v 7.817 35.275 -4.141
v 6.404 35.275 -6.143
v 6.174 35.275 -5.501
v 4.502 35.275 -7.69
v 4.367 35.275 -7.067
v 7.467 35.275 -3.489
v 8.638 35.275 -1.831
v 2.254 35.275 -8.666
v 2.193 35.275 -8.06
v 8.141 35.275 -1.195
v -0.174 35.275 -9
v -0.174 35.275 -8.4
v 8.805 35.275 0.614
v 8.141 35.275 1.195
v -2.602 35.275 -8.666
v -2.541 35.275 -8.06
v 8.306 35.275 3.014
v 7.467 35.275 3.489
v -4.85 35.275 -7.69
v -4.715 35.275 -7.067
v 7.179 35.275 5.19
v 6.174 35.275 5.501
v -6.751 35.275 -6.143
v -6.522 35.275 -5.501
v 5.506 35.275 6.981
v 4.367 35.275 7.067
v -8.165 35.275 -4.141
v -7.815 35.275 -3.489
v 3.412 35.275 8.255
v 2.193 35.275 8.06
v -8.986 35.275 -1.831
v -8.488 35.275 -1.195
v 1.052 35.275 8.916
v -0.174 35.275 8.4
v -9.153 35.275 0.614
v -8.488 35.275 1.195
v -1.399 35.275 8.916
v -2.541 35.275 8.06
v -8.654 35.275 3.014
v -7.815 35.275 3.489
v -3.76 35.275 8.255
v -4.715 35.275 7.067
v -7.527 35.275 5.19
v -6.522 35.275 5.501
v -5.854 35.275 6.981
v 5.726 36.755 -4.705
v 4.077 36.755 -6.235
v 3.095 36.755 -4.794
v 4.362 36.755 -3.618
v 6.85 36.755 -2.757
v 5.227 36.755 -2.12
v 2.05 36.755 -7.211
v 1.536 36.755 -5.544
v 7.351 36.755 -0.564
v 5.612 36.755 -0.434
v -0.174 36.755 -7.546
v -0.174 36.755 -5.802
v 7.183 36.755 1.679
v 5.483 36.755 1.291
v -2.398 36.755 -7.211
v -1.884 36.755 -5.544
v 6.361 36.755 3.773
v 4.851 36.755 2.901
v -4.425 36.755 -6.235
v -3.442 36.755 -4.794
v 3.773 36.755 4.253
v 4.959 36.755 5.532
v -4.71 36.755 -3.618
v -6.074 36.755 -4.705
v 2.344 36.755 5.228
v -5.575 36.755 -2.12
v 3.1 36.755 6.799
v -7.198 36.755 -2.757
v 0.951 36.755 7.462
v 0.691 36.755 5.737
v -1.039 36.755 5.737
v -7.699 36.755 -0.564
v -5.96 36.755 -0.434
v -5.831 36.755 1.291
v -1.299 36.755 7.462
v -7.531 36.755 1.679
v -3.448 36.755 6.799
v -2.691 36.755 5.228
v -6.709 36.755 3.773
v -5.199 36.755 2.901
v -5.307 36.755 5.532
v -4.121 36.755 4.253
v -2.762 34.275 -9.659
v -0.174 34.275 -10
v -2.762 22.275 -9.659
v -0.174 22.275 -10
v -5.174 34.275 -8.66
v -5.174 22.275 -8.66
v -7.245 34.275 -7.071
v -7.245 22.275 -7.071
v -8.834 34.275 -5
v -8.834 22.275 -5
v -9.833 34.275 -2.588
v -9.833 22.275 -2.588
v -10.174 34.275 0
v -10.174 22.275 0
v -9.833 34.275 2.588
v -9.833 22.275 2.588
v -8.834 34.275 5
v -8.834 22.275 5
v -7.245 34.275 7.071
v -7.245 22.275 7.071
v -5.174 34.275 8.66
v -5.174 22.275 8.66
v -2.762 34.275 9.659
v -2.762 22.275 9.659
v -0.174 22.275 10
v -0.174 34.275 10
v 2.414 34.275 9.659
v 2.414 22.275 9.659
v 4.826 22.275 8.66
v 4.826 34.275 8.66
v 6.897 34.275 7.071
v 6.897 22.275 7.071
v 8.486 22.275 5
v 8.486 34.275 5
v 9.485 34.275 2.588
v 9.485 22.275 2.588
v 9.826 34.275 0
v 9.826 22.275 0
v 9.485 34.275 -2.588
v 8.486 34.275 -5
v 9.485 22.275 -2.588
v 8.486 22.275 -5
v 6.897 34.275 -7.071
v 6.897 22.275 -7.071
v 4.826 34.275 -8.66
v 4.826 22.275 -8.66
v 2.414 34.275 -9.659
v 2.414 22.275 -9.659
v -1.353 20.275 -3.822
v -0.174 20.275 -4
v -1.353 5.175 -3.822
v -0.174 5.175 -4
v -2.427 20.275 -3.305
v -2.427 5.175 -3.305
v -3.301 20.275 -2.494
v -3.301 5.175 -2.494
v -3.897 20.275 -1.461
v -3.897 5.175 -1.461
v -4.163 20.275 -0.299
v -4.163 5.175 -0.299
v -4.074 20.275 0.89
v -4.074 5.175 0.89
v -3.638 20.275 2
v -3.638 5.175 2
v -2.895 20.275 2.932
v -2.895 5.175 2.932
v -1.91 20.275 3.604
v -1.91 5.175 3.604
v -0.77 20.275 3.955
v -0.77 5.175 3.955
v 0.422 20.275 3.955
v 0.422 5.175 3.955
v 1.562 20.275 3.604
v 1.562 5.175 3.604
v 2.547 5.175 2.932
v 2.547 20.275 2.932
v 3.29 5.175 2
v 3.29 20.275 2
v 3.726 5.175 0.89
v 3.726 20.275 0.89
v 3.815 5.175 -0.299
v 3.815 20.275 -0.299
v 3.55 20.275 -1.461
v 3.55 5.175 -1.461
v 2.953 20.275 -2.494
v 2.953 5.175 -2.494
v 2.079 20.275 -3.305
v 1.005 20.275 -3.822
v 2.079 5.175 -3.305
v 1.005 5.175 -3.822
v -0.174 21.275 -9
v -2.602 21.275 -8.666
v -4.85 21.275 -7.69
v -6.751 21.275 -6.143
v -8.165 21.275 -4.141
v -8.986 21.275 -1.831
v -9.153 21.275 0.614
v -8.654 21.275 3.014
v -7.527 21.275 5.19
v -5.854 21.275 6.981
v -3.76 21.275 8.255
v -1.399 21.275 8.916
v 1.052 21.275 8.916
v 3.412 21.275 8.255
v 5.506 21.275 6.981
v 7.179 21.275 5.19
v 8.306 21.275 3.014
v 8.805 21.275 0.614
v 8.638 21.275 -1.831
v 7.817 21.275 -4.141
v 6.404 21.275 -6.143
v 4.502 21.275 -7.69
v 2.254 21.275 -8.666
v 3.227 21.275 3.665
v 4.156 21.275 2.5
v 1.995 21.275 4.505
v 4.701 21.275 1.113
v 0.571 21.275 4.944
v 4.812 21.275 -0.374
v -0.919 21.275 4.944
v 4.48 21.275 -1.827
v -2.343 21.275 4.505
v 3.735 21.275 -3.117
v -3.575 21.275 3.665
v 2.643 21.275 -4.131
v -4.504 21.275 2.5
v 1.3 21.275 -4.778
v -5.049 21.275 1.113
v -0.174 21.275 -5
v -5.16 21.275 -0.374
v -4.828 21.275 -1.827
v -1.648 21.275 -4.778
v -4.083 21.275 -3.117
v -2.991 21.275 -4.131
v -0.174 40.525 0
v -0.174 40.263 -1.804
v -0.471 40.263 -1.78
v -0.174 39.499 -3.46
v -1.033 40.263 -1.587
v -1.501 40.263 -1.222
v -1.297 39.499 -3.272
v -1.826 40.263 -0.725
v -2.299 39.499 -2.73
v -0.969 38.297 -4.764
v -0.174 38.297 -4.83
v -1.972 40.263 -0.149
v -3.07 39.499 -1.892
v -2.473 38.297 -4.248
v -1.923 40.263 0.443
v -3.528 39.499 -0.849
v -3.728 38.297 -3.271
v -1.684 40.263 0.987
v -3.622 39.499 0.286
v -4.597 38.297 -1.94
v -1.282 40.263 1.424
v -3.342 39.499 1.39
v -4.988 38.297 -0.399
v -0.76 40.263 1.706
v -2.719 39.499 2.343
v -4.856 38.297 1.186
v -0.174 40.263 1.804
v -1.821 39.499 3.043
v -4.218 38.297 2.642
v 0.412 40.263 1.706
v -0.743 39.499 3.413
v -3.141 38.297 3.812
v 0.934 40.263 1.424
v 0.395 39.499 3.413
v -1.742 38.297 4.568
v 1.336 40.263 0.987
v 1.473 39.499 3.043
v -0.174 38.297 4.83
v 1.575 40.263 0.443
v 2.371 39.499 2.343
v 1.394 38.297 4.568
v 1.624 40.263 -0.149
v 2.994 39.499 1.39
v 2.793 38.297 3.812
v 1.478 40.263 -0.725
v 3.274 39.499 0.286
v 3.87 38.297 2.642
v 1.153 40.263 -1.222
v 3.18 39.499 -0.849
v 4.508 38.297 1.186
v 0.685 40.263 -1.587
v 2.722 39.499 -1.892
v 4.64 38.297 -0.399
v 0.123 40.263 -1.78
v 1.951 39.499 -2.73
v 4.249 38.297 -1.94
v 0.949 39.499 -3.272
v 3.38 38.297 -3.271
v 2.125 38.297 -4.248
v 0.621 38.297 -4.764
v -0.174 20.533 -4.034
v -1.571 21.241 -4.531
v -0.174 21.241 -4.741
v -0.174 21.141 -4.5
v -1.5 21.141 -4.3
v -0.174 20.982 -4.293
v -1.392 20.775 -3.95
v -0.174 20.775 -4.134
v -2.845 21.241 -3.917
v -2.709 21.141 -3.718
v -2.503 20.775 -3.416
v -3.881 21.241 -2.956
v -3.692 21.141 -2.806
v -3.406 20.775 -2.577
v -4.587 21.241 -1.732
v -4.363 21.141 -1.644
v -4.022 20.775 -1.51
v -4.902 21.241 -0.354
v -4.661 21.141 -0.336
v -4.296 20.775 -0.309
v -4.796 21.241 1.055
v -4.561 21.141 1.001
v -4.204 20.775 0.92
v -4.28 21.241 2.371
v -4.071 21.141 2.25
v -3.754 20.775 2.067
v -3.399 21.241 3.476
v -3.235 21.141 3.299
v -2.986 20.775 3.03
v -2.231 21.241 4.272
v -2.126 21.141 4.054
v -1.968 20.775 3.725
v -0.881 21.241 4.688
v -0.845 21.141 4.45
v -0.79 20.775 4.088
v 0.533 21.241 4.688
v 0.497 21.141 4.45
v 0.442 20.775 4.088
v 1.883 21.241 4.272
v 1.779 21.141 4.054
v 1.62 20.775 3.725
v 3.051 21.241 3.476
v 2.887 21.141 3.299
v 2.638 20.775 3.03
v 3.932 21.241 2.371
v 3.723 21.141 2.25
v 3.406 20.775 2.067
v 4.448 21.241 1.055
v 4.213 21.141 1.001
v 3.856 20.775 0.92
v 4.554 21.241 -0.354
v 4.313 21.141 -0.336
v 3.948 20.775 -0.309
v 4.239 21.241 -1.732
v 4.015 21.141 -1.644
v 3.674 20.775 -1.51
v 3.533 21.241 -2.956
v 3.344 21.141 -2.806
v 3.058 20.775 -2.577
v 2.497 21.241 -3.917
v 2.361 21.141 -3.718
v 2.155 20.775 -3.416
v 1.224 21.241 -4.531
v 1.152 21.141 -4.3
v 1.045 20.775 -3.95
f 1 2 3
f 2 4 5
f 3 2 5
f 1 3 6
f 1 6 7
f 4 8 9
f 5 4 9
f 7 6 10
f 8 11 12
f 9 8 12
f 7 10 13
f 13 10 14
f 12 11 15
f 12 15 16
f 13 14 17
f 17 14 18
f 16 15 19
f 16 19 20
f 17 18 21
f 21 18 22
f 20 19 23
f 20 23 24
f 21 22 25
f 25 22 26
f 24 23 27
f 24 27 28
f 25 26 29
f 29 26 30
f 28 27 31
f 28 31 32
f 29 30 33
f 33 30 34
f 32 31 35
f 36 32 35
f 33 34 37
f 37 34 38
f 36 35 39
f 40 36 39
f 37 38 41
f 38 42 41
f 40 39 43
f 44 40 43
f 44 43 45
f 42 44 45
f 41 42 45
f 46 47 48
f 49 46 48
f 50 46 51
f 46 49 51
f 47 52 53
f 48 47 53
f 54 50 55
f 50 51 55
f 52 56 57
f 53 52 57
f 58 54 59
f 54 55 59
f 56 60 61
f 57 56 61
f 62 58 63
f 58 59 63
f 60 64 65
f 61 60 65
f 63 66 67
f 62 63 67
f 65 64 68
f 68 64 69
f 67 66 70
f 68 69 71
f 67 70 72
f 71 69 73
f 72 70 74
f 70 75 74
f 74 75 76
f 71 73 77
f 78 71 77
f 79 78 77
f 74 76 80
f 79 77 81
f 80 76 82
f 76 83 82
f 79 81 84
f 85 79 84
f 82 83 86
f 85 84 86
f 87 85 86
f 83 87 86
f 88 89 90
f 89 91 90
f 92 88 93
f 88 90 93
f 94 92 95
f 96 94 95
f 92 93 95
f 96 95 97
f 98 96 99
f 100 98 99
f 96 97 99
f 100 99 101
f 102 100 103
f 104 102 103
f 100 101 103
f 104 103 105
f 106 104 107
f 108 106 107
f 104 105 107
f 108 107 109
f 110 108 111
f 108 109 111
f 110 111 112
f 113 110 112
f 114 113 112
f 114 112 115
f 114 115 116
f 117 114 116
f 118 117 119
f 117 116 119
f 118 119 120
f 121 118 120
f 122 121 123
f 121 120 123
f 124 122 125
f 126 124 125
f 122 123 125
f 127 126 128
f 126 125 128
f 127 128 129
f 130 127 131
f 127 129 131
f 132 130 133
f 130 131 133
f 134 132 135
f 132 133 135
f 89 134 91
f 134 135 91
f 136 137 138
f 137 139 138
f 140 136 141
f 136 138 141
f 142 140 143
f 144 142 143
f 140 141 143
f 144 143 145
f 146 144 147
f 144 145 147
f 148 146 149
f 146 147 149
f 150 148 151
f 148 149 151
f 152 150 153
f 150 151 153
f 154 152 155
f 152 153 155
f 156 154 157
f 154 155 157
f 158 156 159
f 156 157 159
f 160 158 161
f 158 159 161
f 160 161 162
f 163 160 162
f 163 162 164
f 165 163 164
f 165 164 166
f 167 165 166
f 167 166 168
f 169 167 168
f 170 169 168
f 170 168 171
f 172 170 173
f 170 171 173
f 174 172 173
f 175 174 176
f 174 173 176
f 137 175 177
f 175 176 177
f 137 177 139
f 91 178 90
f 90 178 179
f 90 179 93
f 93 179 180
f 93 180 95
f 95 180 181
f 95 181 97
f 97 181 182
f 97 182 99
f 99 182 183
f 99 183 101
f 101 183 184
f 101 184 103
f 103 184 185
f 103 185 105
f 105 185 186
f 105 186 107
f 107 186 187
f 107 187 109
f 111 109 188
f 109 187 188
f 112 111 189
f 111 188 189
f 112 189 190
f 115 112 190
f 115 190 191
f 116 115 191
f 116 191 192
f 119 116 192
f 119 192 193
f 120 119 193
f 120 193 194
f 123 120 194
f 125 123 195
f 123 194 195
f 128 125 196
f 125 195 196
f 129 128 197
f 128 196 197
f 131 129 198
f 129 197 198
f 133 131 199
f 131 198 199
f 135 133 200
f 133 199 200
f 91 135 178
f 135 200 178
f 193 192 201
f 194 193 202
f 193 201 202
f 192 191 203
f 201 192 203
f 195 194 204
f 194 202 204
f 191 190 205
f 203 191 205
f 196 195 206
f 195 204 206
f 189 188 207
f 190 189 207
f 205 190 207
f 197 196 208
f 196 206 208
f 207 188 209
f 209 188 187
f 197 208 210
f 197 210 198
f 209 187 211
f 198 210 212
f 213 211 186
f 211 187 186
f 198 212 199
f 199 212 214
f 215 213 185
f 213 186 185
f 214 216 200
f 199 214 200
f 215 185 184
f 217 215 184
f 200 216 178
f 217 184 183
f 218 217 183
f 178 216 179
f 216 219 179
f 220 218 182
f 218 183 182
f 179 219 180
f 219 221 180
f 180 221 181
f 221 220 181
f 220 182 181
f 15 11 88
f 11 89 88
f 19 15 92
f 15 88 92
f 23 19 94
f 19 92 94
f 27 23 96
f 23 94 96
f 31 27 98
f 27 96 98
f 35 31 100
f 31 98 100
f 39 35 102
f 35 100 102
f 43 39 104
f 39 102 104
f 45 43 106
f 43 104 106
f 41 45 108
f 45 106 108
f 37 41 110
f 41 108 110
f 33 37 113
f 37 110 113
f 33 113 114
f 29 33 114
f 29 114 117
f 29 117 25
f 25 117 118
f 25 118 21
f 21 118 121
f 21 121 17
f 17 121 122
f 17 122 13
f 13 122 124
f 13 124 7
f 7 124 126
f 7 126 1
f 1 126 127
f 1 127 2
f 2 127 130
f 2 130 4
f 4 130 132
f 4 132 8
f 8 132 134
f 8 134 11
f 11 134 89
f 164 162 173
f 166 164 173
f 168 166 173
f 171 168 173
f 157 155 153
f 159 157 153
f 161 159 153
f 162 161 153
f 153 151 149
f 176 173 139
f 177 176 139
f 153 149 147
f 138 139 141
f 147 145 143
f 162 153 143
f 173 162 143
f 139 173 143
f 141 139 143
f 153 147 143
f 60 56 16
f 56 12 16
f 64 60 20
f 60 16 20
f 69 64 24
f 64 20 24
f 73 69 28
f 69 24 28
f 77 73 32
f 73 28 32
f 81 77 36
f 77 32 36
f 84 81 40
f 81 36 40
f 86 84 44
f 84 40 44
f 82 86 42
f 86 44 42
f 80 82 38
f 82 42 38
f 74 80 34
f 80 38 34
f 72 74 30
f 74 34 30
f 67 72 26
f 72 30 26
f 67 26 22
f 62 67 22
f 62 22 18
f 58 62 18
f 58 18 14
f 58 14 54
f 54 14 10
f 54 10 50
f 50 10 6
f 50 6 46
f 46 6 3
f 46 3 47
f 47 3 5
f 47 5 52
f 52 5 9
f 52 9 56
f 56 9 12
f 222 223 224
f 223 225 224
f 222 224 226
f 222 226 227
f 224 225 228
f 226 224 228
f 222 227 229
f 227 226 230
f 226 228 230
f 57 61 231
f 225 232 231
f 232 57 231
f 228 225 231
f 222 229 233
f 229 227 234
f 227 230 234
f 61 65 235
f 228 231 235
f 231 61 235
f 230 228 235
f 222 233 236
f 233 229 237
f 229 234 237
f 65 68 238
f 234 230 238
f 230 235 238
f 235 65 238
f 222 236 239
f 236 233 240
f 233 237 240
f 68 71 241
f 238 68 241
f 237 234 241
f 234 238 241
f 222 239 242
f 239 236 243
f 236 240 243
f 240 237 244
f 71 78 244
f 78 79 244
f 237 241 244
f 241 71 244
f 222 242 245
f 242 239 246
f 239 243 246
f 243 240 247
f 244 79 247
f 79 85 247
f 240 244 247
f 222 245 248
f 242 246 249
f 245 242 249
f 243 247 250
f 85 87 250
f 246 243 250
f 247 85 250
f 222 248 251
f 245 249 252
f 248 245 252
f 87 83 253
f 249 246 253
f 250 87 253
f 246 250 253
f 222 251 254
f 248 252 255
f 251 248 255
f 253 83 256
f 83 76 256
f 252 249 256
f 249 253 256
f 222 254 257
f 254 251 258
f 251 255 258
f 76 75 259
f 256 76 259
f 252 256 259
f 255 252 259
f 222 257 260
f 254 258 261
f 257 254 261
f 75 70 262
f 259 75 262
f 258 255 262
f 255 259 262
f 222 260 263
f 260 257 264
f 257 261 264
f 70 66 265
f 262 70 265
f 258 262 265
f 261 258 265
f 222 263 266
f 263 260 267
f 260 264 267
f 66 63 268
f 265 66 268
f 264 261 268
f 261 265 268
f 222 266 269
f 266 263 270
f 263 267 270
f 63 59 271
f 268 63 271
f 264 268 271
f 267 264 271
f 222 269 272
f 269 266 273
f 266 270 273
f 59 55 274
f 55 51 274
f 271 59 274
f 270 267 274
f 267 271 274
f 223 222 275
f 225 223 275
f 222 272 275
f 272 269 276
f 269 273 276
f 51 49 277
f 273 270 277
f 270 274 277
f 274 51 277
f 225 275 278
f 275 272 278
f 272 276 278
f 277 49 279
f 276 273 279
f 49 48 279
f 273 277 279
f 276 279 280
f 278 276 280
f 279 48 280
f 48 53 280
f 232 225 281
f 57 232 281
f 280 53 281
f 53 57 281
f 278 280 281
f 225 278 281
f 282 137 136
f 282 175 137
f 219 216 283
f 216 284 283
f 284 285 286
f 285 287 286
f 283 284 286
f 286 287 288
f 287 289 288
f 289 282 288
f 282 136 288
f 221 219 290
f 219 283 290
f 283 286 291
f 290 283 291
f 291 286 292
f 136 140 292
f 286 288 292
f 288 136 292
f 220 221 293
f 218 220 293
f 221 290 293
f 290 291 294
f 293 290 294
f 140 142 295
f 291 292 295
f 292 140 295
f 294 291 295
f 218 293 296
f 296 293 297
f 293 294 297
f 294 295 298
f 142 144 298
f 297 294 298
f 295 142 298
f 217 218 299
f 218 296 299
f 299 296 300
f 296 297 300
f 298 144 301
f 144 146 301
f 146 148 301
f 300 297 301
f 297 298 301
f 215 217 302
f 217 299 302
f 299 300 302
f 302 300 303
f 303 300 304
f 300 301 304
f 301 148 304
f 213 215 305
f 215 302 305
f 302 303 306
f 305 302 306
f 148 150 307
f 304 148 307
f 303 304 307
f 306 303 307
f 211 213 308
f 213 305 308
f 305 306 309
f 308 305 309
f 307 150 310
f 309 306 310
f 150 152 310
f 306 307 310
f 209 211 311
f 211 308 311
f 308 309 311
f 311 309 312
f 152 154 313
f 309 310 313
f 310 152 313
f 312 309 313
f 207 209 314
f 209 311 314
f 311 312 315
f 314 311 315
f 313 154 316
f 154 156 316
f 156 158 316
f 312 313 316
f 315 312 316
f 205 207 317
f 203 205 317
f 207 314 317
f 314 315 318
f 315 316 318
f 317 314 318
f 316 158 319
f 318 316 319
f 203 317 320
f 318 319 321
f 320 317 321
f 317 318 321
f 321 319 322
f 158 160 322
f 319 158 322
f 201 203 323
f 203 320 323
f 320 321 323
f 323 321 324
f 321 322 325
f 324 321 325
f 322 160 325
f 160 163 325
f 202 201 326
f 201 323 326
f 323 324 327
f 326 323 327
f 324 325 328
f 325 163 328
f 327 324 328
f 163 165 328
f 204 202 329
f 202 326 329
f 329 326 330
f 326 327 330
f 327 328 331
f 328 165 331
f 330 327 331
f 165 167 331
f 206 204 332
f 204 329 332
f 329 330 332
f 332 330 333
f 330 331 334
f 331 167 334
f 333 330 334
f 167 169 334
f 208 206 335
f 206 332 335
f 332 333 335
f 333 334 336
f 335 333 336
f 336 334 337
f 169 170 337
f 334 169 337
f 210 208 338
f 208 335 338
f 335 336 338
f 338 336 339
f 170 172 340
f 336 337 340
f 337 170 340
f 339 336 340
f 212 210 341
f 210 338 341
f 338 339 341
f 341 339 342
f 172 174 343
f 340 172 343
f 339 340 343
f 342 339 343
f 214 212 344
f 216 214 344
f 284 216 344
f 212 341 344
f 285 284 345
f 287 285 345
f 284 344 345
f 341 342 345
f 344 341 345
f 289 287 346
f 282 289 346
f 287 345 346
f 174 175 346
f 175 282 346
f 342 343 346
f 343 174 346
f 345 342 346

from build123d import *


with BuildPart() as part:
    # Sketch1 → Revolve1 (revolve)
    with BuildSketch(Plane.XY, mode=Mode.PRIVATE) as revolve1_sk:
        with BuildLine():
            Line((5.628277432, 36.754630752), (7.372072988, 36.754630752))
            Line((7.372072988, 36.754630752), (8.226027868, 35.274630752))
            Line((8.226027868, 35.274630752), (8.826027868, 35.274630752))
            Line((8.826027868, 35.274630752), (9.826027868, 34.274630752))
            Line((9.826027868, 34.274630752), (9.826027868, 22.274630752))
            Line((9.826027868, 22.274630752), (8.826027868, 21.274630752))
            Line((8.826027868, 21.274630752), (4.826027868, 21.274630752))
            ThreePointArc((4.826027868, 21.274630752), (4.118921087, 20.981737533), (3.826027868, 20.274630752))
            Line((3.826027868, 20.274630752), (3.826027868, 5.174630752))
            Line((3.826027868, 5.174630752), (-0.173972132, 5.174630752))
            Line((-0.173972132, 5.174630752), (-0.173972132, 40.524630752))
            ThreePointArc((-0.173972132, 40.524630752), (3.285760517, 39.499360792), (5.628277432, 36.754630752))
        make_face()
    revolve(revolve1_sk.sketch.rotate(Axis((-0.173972132, 0, 0), (0, 1, 0)), 90), axis=Axis((-0.173972132, 0, 0), (0, 1, 0)))


solid = part.part
